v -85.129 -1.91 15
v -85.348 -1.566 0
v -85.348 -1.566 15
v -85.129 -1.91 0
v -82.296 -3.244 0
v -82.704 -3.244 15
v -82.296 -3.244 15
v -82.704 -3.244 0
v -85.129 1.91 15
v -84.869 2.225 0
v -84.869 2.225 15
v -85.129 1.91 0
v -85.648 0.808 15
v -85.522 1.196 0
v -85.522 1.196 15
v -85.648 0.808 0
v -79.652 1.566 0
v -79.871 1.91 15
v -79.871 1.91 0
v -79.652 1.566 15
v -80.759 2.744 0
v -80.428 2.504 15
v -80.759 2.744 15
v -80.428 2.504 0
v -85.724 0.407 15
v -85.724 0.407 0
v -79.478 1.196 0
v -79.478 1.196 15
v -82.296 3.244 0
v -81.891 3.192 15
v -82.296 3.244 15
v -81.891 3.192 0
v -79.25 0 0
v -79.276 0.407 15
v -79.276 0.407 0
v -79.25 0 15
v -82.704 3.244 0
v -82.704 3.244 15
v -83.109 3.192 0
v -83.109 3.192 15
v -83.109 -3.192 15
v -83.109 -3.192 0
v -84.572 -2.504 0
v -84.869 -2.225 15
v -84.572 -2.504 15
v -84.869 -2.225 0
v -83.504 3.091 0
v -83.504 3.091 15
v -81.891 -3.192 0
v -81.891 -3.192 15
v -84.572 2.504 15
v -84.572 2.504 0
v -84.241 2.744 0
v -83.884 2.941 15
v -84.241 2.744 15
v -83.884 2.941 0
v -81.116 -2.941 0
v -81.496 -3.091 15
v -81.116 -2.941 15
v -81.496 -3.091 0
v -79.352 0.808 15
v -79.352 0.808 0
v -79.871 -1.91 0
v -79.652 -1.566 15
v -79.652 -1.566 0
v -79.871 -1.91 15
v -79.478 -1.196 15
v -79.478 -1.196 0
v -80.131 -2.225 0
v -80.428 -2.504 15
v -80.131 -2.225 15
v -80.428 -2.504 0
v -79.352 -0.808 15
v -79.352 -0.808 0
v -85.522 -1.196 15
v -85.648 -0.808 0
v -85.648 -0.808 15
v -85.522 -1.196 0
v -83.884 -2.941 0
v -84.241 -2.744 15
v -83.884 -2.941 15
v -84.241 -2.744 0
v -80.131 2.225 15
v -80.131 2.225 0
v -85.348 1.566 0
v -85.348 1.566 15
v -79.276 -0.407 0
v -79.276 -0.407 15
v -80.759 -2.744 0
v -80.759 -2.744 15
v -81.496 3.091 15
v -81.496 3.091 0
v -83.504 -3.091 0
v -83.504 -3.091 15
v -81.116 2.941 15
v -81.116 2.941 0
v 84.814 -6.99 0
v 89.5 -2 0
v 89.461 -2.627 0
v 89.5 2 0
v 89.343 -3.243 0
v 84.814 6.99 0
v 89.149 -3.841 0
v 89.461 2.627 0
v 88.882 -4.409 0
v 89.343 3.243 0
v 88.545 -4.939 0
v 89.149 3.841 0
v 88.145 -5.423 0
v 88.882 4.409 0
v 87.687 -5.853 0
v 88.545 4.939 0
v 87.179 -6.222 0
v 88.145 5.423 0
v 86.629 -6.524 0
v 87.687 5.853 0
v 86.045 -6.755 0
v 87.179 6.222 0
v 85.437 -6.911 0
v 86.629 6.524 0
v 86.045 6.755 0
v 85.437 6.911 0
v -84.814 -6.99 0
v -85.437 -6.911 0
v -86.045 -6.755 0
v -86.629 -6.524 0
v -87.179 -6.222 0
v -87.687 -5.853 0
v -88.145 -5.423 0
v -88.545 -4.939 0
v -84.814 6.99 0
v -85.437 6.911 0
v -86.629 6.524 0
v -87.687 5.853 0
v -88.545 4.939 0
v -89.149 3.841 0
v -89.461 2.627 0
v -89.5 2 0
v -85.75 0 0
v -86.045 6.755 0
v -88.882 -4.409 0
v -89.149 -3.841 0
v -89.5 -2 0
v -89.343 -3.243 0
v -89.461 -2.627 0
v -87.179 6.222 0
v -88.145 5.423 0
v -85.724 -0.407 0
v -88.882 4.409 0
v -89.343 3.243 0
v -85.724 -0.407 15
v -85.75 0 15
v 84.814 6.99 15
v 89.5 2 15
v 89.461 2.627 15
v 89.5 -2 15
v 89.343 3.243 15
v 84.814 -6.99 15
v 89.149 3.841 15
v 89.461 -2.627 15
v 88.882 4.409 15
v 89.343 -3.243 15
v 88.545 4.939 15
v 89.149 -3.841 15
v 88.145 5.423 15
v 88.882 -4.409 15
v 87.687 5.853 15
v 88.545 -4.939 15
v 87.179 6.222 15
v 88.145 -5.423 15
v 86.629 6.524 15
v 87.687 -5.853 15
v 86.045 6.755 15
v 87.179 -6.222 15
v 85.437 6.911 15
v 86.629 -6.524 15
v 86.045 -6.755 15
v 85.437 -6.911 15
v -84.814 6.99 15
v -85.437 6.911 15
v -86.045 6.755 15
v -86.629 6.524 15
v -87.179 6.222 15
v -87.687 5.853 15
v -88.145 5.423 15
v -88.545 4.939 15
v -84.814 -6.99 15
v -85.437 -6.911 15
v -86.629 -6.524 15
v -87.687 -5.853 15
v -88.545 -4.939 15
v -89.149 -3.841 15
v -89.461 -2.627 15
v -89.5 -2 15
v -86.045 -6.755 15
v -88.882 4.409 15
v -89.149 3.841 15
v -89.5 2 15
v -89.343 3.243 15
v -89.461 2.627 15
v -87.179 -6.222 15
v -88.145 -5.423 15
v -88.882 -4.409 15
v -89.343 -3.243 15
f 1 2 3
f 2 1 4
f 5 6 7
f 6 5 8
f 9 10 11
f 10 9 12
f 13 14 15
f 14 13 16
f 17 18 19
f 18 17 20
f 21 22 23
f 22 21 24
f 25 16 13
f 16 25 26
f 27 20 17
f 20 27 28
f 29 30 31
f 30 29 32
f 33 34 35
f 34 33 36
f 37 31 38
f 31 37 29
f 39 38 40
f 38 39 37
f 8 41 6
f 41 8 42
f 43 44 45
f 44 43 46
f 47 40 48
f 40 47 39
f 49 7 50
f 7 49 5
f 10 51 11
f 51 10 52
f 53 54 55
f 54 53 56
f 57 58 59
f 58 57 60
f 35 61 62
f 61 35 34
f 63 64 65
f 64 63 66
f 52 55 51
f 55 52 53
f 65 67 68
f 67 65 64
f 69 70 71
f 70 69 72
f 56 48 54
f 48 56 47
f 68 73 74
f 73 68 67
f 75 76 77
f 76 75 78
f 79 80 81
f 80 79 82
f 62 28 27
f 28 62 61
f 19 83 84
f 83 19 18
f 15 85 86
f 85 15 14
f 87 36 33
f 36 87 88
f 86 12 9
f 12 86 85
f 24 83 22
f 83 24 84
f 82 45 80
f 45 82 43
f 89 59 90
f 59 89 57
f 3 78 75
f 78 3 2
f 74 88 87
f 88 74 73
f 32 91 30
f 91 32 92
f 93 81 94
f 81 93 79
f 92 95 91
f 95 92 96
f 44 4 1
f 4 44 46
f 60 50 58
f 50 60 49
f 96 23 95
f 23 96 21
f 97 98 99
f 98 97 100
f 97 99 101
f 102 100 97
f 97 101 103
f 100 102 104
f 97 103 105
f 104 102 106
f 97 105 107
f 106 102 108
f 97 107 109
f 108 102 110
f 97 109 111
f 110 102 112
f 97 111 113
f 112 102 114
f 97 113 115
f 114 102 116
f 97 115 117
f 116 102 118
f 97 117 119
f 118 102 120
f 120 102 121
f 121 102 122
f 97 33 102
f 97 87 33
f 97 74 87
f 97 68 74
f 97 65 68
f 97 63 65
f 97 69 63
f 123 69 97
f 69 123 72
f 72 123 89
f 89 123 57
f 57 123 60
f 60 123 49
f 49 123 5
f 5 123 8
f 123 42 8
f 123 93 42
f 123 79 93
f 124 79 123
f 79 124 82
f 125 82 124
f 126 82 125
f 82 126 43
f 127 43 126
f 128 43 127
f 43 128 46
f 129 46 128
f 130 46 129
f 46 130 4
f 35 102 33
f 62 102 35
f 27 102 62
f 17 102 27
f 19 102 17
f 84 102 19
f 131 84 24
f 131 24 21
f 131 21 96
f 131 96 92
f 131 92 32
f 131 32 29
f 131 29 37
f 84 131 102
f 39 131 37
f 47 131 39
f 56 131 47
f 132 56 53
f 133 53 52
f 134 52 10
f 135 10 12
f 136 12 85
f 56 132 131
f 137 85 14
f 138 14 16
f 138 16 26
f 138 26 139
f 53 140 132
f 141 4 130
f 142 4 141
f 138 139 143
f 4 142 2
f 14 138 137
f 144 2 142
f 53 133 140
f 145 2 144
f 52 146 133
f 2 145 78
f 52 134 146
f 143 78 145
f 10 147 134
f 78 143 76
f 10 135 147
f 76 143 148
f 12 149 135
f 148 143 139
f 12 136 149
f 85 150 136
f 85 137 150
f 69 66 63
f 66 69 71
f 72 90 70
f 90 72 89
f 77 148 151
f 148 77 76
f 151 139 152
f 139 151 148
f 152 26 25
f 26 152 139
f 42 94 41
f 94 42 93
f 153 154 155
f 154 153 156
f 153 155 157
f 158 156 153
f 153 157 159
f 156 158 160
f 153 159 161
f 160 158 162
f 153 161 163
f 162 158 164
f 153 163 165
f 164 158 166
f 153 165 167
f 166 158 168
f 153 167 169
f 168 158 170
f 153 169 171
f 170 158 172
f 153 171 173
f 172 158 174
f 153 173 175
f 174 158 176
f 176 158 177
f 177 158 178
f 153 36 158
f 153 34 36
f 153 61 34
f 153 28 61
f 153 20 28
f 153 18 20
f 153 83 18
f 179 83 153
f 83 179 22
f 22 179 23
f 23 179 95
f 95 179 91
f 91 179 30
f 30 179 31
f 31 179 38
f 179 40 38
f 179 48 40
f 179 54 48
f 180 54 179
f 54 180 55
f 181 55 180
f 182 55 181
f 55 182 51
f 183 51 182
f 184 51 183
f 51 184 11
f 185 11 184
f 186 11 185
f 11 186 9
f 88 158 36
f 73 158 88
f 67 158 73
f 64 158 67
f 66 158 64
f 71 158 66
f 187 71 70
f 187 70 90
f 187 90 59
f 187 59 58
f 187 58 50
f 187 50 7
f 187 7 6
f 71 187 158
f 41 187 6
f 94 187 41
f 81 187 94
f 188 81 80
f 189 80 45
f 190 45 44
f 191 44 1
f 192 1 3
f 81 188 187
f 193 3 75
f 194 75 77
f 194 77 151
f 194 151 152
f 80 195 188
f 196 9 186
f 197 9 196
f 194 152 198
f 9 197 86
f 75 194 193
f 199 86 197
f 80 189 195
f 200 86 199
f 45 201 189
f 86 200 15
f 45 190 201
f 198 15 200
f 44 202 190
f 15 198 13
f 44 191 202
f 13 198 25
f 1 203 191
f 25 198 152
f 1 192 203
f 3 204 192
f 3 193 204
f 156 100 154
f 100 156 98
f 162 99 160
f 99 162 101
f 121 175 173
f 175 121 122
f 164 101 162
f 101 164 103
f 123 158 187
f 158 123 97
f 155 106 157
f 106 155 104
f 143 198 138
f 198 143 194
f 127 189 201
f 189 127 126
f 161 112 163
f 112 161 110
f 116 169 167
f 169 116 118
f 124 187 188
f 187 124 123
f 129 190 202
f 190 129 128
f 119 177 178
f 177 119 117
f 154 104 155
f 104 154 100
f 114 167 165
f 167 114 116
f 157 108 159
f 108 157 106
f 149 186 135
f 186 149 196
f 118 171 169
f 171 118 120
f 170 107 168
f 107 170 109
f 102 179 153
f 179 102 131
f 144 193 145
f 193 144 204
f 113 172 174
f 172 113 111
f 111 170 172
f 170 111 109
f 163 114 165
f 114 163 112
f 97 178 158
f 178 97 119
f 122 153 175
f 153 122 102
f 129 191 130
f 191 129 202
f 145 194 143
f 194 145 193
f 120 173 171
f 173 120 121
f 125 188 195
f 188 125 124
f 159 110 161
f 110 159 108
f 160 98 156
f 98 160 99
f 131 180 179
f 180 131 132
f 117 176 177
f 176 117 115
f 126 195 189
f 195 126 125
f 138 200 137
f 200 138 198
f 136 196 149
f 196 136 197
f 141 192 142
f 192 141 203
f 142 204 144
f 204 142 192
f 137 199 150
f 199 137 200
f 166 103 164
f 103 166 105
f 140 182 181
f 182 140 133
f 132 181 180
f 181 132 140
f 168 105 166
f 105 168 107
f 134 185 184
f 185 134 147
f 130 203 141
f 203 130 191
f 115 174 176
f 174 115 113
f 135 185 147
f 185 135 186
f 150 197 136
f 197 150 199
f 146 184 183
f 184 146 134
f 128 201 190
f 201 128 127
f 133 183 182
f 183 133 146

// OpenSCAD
$fn = 50;


difference() {
	union() {
		hull() {
			translate(v = [-84.5000000000, 2.0000000000, 0]) {
				cylinder(h = 15, r = 5);
			}
			translate(v = [84.5000000000, 2.0000000000, 0]) {
				cylinder(h = 15, r = 5);
			}
			translate(v = [-84.5000000000, -2.0000000000, 0]) {
				cylinder(h = 15, r = 5);
			}
			translate(v = [84.5000000000, -2.0000000000, 0]) {
				cylinder(h = 15, r = 5);
			}
		}
	}
	union() {
		translate(v = [-82.5000000000, 0.0000000000, 0]) {
			cylinder(h = 15, r = 3.2500000000);
		}
		translate(v = [-82.5000000000, 0.0000000000, 0]) {
			cylinder(h = 15, r = 1.8000000000);
		}
		translate(v = [-82.5000000000, 0.0000000000, 0]) {
			cylinder(h = 15, r = 1.8000000000);
		}
		translate(v = [-82.5000000000, 0.0000000000, 0]) {
			cylinder(h = 15, r = 1.8000000000);
		}
	}
}
